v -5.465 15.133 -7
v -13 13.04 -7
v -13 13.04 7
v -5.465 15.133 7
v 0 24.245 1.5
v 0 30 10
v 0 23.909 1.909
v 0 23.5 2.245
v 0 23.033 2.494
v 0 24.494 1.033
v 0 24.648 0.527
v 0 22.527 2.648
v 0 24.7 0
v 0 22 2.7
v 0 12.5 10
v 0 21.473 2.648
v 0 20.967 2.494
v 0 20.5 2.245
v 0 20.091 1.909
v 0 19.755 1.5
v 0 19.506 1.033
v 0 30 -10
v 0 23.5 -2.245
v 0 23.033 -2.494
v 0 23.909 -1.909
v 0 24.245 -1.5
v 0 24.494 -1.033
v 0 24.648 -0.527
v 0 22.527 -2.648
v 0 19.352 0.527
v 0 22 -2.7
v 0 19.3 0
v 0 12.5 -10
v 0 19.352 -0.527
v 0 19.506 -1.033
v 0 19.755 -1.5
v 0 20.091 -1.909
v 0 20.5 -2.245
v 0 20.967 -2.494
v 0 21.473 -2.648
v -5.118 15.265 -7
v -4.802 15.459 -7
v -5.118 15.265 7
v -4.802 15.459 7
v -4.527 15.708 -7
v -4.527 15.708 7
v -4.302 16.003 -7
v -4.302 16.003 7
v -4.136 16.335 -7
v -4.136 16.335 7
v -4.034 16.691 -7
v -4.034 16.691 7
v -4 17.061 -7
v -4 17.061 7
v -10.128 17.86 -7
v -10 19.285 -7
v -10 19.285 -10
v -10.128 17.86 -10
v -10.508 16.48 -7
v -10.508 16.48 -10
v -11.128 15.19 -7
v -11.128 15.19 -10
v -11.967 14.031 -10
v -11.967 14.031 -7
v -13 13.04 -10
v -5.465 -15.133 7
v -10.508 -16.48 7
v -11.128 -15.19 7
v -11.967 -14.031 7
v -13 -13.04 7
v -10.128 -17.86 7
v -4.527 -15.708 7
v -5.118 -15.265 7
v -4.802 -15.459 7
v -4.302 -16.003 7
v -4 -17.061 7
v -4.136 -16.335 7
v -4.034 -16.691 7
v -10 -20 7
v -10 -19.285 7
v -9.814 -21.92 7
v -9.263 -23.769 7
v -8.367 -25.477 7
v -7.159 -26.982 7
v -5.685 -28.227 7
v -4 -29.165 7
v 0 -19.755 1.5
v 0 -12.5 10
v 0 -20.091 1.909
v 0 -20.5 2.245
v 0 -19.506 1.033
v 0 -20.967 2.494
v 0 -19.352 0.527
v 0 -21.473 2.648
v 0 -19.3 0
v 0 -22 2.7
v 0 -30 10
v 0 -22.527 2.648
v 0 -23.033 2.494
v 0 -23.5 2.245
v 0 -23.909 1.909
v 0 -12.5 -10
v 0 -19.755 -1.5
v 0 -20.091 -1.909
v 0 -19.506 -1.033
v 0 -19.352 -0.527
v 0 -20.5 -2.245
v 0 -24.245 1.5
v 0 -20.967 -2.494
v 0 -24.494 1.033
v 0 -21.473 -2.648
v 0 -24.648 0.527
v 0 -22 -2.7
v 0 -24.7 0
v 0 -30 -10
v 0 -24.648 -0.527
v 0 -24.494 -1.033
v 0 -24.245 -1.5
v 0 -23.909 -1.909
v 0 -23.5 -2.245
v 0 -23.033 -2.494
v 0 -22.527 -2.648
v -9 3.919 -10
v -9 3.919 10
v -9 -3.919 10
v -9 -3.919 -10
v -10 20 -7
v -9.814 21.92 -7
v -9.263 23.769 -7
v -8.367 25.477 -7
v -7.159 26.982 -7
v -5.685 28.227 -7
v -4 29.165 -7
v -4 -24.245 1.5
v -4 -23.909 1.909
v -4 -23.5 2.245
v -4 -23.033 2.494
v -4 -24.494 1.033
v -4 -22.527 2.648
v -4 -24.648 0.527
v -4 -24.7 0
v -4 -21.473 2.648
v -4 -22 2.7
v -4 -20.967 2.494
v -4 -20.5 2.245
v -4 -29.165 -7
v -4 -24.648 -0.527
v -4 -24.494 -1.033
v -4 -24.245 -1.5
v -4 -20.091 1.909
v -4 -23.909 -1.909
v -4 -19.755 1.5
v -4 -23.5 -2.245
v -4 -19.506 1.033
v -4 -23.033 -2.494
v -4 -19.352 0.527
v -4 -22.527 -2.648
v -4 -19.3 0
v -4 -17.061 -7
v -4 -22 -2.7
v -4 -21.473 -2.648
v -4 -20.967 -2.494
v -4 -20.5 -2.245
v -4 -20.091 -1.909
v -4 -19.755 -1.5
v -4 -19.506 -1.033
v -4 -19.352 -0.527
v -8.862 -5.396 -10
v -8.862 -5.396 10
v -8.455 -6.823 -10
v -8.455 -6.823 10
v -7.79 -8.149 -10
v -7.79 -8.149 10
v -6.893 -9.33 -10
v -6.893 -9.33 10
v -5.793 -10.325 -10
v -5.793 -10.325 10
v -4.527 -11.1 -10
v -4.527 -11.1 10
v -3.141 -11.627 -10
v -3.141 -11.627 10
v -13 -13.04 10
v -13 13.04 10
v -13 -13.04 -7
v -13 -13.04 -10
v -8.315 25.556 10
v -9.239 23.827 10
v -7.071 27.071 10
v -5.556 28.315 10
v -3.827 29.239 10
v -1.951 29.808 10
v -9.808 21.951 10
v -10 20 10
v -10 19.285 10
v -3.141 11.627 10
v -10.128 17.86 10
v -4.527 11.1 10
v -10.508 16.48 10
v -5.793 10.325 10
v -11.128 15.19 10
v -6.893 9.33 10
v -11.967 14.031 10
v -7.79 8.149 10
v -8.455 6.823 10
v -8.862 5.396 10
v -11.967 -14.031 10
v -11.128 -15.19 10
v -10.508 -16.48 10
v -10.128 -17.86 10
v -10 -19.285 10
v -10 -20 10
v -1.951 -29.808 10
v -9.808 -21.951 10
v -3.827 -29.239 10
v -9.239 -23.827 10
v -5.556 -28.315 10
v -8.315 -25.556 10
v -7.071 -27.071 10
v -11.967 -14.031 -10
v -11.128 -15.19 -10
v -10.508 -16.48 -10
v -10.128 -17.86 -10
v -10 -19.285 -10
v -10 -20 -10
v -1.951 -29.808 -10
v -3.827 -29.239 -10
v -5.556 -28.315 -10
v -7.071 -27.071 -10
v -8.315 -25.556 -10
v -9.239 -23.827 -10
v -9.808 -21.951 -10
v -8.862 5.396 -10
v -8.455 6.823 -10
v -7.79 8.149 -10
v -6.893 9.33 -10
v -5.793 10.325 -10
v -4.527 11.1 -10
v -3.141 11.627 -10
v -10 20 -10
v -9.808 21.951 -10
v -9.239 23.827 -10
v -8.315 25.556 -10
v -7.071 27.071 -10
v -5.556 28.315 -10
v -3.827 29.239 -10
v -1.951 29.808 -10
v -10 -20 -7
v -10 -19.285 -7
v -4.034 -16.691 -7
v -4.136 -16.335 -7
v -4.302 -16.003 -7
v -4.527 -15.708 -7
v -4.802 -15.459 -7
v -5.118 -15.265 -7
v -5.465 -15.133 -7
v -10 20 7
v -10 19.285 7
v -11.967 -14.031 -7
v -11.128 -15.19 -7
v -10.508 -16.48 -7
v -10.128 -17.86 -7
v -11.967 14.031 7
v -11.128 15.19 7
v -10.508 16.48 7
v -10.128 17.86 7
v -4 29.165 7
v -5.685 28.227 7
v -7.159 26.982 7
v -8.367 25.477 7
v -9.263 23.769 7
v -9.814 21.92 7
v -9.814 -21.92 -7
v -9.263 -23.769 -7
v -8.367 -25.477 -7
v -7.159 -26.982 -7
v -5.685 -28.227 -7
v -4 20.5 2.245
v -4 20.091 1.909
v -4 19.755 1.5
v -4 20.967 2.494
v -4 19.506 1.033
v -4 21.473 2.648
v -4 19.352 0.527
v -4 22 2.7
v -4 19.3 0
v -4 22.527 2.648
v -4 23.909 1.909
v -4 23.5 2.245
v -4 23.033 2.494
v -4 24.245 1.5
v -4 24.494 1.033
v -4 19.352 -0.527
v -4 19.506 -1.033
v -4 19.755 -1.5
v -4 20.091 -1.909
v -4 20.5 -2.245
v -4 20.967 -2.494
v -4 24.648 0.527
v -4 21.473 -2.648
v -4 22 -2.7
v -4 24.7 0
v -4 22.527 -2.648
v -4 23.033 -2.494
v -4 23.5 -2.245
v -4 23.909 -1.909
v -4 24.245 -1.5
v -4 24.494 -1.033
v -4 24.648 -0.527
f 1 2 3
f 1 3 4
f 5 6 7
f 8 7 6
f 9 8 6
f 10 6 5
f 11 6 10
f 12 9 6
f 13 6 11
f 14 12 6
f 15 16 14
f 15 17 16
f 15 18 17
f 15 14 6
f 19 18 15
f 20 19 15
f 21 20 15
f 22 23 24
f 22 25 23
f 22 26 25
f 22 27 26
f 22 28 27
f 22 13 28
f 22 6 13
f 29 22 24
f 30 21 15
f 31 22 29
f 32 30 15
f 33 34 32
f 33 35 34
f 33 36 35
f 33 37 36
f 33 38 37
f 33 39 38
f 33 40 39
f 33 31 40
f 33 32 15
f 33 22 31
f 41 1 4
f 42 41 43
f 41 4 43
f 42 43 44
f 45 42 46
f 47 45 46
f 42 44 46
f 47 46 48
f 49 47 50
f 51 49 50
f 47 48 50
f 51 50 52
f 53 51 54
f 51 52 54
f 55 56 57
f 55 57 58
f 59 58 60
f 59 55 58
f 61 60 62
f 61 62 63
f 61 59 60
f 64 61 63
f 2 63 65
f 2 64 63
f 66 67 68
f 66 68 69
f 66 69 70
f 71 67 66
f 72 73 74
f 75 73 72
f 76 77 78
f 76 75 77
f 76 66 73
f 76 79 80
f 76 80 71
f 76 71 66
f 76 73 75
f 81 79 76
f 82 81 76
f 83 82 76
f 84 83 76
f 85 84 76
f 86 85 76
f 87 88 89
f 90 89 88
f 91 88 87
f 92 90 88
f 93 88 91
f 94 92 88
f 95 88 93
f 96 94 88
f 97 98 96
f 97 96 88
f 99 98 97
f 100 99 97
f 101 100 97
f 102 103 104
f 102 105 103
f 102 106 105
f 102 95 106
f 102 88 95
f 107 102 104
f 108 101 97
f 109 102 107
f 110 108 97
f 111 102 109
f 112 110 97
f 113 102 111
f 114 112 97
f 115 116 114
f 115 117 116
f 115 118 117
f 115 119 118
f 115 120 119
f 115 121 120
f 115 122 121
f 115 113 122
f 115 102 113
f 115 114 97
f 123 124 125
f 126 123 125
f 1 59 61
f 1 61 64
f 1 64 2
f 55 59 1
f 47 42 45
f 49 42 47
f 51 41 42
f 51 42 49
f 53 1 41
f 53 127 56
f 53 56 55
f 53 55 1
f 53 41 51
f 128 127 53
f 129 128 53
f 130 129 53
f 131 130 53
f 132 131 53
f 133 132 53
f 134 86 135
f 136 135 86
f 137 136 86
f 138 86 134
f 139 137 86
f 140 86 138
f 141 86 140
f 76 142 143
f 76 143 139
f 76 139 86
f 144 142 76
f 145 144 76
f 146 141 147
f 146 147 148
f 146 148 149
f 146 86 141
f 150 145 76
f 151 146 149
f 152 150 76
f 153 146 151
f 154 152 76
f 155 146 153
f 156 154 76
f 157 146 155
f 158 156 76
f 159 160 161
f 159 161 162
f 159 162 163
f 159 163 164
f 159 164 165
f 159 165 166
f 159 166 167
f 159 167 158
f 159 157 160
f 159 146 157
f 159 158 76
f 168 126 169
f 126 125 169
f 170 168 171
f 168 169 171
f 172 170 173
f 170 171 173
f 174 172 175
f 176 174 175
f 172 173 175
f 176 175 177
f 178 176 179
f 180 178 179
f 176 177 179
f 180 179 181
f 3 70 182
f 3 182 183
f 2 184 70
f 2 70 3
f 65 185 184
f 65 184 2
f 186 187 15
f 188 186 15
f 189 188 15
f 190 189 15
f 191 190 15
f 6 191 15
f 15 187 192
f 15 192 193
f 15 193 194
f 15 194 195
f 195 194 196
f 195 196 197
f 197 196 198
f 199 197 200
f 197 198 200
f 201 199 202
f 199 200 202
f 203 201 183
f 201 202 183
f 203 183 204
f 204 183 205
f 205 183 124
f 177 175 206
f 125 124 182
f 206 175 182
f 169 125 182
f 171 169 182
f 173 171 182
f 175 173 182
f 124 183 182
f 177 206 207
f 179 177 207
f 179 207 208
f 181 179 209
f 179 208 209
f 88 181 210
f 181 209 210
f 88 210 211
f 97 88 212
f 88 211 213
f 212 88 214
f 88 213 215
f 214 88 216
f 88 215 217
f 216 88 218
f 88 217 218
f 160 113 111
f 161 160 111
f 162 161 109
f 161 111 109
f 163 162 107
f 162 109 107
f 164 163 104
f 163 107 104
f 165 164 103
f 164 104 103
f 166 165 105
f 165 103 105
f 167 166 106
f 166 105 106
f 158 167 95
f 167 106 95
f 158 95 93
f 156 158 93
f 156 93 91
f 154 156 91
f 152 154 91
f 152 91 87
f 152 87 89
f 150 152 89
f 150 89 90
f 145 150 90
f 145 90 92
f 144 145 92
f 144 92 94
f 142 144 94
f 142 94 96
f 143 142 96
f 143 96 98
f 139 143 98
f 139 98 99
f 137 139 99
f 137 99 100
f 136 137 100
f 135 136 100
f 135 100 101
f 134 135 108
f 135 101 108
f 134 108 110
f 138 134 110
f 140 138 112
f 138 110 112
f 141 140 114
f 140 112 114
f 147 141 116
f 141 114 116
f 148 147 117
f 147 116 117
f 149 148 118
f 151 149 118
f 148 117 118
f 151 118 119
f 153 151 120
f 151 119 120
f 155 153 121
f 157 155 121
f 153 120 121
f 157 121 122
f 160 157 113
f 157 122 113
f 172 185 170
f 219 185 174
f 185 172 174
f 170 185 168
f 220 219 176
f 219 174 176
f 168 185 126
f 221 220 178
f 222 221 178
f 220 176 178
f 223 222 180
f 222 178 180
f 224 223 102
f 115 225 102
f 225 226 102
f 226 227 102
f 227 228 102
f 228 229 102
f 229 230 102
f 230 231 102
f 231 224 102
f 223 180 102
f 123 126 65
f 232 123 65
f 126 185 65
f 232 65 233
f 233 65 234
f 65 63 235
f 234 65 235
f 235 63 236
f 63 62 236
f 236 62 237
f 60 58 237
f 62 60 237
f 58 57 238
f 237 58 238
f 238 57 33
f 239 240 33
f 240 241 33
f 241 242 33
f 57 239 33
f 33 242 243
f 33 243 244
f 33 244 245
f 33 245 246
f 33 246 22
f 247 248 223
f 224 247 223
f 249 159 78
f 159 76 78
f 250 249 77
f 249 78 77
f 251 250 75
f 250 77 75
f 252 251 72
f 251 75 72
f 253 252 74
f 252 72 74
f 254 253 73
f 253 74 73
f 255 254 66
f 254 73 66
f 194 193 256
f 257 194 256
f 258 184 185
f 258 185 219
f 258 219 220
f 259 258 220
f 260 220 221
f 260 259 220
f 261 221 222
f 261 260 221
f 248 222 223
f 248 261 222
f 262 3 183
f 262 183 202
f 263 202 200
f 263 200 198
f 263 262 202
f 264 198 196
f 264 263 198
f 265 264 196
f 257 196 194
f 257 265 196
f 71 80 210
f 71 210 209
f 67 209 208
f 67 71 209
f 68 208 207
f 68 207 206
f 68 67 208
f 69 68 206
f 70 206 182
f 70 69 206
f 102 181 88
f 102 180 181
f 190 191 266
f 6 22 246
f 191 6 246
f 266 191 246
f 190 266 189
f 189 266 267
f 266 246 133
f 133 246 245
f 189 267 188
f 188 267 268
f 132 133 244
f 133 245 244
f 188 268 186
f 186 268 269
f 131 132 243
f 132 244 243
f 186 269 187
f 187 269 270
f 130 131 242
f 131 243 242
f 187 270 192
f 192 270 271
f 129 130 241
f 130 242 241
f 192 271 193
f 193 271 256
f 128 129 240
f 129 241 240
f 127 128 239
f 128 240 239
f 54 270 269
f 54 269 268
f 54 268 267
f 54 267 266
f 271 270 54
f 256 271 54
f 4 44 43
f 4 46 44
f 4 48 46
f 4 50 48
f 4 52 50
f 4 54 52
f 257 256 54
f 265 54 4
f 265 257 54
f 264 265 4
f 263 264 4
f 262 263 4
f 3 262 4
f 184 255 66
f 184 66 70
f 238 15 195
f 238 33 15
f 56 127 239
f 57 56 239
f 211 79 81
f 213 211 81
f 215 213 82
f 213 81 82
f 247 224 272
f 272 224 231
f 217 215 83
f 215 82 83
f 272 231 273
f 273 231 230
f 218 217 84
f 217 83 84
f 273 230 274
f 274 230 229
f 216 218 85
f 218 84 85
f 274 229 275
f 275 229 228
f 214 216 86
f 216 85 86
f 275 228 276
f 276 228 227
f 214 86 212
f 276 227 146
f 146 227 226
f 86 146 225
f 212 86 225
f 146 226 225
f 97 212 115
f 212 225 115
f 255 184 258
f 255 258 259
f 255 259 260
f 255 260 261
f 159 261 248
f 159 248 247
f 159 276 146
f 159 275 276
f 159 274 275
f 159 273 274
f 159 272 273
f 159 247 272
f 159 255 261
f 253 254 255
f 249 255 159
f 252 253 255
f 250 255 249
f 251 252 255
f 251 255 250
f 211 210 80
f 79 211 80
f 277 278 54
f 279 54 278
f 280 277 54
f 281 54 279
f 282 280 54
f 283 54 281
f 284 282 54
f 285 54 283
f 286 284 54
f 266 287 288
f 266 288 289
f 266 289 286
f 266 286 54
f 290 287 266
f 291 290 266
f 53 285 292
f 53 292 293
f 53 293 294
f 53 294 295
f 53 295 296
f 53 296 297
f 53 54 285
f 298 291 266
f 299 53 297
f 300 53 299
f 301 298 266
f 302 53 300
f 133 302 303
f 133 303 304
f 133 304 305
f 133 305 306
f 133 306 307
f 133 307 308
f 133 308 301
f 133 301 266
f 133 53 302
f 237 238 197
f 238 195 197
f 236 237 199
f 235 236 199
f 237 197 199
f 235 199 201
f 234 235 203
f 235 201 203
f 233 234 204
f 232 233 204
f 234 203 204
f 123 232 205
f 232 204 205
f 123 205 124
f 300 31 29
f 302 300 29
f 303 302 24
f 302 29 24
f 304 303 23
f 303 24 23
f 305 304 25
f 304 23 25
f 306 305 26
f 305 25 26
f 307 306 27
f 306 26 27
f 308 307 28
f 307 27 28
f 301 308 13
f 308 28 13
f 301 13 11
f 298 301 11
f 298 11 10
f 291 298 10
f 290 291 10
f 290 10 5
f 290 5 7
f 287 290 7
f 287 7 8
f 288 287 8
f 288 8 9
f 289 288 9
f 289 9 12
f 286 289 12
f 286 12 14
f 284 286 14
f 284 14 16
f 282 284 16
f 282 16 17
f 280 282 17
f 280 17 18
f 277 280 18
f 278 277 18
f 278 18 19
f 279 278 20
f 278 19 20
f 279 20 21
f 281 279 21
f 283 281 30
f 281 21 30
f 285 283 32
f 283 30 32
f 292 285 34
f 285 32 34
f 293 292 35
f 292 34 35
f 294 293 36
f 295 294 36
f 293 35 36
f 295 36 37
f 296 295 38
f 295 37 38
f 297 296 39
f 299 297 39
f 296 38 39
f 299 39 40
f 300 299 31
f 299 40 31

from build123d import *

# Parameters (mm, degrees)
EXTRUDE_1_DEPTH      = 10
EXTRUDE_1_DEPTH_BACK = 10
SKETCH_2_R           = 2.7
CUT_EXTRUDE_1_DEPTH  = 35.190641995
SKETCH_3_W           = 3
SKETCH_3_H           = 17.5
EXTRUDE_2_DEPTH      = 10
FILLET_1_R           = 10
FILLET_2_R           = 8
FILLET_3_R           = 8
FILLET_4_R           = 2


with BuildPart() as part:
    # 草图1 → 凸台-拉伸1 (new, two sides: drawn at the far end of the back side and taken through both)
    with BuildSketch(Plane.XY.offset(-EXTRUDE_1_DEPTH_BACK)):
        Polygon((0, 30), (0, 12.5), (-9, 10), (-9, -10), (0, -12.5), (0, -30), (-4, -30), (-4, -15.540342598), (-13, -13.040342598), (-13, 13.040342598), (-4, 15.540342598), (-4, 30), align=None)
    extrude(amount=EXTRUDE_1_DEPTH + EXTRUDE_1_DEPTH_BACK)

    # 草图2 → 切除-拉伸1 (cut, through all)
    with BuildSketch(Plane(origin=(0, 0, 0), x_dir=(0, 0, -1), z_dir=(1, 0, 0))):
        with Locations((0, 22)):
            Circle(SKETCH_2_R)
        with Locations((0, -22)):
            Circle(SKETCH_2_R)
    extrude(amount=-CUT_EXTRUDE_1_DEPTH, mode=Mode.SUBTRACT)

    # 草图3 → 凸台-拉伸2 (add)
    with BuildSketch(Plane(origin=(0, 0, 0), x_dir=(0, 0, -1), z_dir=(1, 0, 0))):
        with Locations((-8.5, 21.25)):
            Rectangle(SKETCH_3_W, SKETCH_3_H)
        with Locations((8.5, 21.25)):
            Rectangle(SKETCH_3_W, SKETCH_3_H)
        with Locations((-8.5, -21.25)):
            Rectangle(SKETCH_3_W, SKETCH_3_H)
        with Locations((8.5, -21.25)):
            Rectangle(SKETCH_3_W, SKETCH_3_H)
    extrude(amount=-EXTRUDE_2_DEPTH)

    # 圆角1
    # the kernel refuses this fillet: 10 mm, written as the material it takes off along each edge
    with BuildSketch(Plane(origin=(-10, -30, -35), x_dir=(1, 0, 0), z_dir=(0, 0, 1)), Plane(origin=(-10, 30, -35), x_dir=(0, -1, 0), z_dir=(0, 0, 1))) as fillet_1_piece_1:
        with BuildLine():
            CenterArc((FILLET_1_R, FILLET_1_R), FILLET_1_R, 180, 90)
            Line((0, FILLET_1_R), (0, 0))
            Line((0, 0), (FILLET_1_R, 0))
        make_face()
    extrude(amount=53, mode=Mode.SUBTRACT)

    # 圆角2
    # the kernel refuses this fillet: 8 mm, written as the material it adds along each edge
    with BuildSketch(Plane(origin=(-10, 13.873675932, 7), x_dir=(0, 1, 0), z_dir=(0, 0, 1))) as fillet_2_piece_1:
        with BuildLine():
            CenterArc((5.411664665, 8), FILLET_2_R, 218.682187453, 51.317812547)
            Line((-0.833333333, 3), (-0.958233293, 2.9))
            ThreePointArc((-0.958233293, 2.9), (-0.570829532, 1.457176982), (-0.154162866, -0.042823018))
            Line((-0.154162866, -0.042823018), (0, -0.16))
            Line((0, -0.16), (5.411664665, -0.16))
            Line((5.411664665, -0.16), (5.411664665, 0))
        make_face()
    extrude(amount=3)
    with BuildSketch(Plane(origin=(-10, 13.873675932, -7), x_dir=(-0.963517909629979, -0.26764386378595645, 0), z_dir=(0, 0, -1)), Plane(origin=(-10, -13.873675932, 7), x_dir=(-0.963517909629979, 0.26764386378595645, 0), z_dir=(0, 0, 1))) as fillet_2_piece_2:
        with BuildLine():
            CenterArc((6.259744437, 7.355386736), FILLET_2_R, 195.524110997, 51.317812547)
            Line((-1.44839884, 5.214235826), (-1.602561706, 5.171412807))
            Line((-1.602561706, 5.171412807), (-0.154162866, -0.042823018))
            Line((-0.154162866, -0.042823018), (0, -0.16))
            ThreePointArc((0, -0.16), (1.556795141, -0.16), (3.050667199, -0.147107735))
            Line((3.050667199, -0.147107735), (3.113590282, 0))
        make_face()
    extrude(amount=3)
    with BuildSketch(Plane(origin=(-10, -13.873675932, -7), x_dir=(-0.963517909629979, 0.26764386378595645, 0), z_dir=(0, 0, -1))) as fillet_2_piece_3:
        with BuildLine():
            CenterArc((6.259744437, -7.355386736), FILLET_2_R, 113.158076457, 51.317812547)
            Line((-1.44839884, -5.214235826), (-1.602561706, -5.171412807))
            Line((-1.602561706, -5.171412807), (-0.154162866, 0.042823018))
            Line((-0.154162866, 0.042823018), (0, 0.16))
            ThreePointArc((0, 0.16), (1.556795141, 0.16), (3.050667199, 0.147107735))
            Line((3.050667199, 0.147107735), (3.113590282, 0))
        make_face()
    extrude(amount=3)

    # 圆角3
    fillet_3_edges = [part.edges().sort_by_distance(p)[0] for p in [
        (-9, 10, 0),
        (-9, -10, 0),
    ]]
    fillet(fillet_3_edges, radius=FILLET_3_R)

    # 圆角4
    fillet_4_edges = [part.edges().sort_by_distance(p)[0] for p in [
        (-4, 15.540342598, 0),
        (-4, -15.540342598, 0),
    ]]
    fillet(fillet_4_edges, radius=FILLET_4_R)


solid = part.part
